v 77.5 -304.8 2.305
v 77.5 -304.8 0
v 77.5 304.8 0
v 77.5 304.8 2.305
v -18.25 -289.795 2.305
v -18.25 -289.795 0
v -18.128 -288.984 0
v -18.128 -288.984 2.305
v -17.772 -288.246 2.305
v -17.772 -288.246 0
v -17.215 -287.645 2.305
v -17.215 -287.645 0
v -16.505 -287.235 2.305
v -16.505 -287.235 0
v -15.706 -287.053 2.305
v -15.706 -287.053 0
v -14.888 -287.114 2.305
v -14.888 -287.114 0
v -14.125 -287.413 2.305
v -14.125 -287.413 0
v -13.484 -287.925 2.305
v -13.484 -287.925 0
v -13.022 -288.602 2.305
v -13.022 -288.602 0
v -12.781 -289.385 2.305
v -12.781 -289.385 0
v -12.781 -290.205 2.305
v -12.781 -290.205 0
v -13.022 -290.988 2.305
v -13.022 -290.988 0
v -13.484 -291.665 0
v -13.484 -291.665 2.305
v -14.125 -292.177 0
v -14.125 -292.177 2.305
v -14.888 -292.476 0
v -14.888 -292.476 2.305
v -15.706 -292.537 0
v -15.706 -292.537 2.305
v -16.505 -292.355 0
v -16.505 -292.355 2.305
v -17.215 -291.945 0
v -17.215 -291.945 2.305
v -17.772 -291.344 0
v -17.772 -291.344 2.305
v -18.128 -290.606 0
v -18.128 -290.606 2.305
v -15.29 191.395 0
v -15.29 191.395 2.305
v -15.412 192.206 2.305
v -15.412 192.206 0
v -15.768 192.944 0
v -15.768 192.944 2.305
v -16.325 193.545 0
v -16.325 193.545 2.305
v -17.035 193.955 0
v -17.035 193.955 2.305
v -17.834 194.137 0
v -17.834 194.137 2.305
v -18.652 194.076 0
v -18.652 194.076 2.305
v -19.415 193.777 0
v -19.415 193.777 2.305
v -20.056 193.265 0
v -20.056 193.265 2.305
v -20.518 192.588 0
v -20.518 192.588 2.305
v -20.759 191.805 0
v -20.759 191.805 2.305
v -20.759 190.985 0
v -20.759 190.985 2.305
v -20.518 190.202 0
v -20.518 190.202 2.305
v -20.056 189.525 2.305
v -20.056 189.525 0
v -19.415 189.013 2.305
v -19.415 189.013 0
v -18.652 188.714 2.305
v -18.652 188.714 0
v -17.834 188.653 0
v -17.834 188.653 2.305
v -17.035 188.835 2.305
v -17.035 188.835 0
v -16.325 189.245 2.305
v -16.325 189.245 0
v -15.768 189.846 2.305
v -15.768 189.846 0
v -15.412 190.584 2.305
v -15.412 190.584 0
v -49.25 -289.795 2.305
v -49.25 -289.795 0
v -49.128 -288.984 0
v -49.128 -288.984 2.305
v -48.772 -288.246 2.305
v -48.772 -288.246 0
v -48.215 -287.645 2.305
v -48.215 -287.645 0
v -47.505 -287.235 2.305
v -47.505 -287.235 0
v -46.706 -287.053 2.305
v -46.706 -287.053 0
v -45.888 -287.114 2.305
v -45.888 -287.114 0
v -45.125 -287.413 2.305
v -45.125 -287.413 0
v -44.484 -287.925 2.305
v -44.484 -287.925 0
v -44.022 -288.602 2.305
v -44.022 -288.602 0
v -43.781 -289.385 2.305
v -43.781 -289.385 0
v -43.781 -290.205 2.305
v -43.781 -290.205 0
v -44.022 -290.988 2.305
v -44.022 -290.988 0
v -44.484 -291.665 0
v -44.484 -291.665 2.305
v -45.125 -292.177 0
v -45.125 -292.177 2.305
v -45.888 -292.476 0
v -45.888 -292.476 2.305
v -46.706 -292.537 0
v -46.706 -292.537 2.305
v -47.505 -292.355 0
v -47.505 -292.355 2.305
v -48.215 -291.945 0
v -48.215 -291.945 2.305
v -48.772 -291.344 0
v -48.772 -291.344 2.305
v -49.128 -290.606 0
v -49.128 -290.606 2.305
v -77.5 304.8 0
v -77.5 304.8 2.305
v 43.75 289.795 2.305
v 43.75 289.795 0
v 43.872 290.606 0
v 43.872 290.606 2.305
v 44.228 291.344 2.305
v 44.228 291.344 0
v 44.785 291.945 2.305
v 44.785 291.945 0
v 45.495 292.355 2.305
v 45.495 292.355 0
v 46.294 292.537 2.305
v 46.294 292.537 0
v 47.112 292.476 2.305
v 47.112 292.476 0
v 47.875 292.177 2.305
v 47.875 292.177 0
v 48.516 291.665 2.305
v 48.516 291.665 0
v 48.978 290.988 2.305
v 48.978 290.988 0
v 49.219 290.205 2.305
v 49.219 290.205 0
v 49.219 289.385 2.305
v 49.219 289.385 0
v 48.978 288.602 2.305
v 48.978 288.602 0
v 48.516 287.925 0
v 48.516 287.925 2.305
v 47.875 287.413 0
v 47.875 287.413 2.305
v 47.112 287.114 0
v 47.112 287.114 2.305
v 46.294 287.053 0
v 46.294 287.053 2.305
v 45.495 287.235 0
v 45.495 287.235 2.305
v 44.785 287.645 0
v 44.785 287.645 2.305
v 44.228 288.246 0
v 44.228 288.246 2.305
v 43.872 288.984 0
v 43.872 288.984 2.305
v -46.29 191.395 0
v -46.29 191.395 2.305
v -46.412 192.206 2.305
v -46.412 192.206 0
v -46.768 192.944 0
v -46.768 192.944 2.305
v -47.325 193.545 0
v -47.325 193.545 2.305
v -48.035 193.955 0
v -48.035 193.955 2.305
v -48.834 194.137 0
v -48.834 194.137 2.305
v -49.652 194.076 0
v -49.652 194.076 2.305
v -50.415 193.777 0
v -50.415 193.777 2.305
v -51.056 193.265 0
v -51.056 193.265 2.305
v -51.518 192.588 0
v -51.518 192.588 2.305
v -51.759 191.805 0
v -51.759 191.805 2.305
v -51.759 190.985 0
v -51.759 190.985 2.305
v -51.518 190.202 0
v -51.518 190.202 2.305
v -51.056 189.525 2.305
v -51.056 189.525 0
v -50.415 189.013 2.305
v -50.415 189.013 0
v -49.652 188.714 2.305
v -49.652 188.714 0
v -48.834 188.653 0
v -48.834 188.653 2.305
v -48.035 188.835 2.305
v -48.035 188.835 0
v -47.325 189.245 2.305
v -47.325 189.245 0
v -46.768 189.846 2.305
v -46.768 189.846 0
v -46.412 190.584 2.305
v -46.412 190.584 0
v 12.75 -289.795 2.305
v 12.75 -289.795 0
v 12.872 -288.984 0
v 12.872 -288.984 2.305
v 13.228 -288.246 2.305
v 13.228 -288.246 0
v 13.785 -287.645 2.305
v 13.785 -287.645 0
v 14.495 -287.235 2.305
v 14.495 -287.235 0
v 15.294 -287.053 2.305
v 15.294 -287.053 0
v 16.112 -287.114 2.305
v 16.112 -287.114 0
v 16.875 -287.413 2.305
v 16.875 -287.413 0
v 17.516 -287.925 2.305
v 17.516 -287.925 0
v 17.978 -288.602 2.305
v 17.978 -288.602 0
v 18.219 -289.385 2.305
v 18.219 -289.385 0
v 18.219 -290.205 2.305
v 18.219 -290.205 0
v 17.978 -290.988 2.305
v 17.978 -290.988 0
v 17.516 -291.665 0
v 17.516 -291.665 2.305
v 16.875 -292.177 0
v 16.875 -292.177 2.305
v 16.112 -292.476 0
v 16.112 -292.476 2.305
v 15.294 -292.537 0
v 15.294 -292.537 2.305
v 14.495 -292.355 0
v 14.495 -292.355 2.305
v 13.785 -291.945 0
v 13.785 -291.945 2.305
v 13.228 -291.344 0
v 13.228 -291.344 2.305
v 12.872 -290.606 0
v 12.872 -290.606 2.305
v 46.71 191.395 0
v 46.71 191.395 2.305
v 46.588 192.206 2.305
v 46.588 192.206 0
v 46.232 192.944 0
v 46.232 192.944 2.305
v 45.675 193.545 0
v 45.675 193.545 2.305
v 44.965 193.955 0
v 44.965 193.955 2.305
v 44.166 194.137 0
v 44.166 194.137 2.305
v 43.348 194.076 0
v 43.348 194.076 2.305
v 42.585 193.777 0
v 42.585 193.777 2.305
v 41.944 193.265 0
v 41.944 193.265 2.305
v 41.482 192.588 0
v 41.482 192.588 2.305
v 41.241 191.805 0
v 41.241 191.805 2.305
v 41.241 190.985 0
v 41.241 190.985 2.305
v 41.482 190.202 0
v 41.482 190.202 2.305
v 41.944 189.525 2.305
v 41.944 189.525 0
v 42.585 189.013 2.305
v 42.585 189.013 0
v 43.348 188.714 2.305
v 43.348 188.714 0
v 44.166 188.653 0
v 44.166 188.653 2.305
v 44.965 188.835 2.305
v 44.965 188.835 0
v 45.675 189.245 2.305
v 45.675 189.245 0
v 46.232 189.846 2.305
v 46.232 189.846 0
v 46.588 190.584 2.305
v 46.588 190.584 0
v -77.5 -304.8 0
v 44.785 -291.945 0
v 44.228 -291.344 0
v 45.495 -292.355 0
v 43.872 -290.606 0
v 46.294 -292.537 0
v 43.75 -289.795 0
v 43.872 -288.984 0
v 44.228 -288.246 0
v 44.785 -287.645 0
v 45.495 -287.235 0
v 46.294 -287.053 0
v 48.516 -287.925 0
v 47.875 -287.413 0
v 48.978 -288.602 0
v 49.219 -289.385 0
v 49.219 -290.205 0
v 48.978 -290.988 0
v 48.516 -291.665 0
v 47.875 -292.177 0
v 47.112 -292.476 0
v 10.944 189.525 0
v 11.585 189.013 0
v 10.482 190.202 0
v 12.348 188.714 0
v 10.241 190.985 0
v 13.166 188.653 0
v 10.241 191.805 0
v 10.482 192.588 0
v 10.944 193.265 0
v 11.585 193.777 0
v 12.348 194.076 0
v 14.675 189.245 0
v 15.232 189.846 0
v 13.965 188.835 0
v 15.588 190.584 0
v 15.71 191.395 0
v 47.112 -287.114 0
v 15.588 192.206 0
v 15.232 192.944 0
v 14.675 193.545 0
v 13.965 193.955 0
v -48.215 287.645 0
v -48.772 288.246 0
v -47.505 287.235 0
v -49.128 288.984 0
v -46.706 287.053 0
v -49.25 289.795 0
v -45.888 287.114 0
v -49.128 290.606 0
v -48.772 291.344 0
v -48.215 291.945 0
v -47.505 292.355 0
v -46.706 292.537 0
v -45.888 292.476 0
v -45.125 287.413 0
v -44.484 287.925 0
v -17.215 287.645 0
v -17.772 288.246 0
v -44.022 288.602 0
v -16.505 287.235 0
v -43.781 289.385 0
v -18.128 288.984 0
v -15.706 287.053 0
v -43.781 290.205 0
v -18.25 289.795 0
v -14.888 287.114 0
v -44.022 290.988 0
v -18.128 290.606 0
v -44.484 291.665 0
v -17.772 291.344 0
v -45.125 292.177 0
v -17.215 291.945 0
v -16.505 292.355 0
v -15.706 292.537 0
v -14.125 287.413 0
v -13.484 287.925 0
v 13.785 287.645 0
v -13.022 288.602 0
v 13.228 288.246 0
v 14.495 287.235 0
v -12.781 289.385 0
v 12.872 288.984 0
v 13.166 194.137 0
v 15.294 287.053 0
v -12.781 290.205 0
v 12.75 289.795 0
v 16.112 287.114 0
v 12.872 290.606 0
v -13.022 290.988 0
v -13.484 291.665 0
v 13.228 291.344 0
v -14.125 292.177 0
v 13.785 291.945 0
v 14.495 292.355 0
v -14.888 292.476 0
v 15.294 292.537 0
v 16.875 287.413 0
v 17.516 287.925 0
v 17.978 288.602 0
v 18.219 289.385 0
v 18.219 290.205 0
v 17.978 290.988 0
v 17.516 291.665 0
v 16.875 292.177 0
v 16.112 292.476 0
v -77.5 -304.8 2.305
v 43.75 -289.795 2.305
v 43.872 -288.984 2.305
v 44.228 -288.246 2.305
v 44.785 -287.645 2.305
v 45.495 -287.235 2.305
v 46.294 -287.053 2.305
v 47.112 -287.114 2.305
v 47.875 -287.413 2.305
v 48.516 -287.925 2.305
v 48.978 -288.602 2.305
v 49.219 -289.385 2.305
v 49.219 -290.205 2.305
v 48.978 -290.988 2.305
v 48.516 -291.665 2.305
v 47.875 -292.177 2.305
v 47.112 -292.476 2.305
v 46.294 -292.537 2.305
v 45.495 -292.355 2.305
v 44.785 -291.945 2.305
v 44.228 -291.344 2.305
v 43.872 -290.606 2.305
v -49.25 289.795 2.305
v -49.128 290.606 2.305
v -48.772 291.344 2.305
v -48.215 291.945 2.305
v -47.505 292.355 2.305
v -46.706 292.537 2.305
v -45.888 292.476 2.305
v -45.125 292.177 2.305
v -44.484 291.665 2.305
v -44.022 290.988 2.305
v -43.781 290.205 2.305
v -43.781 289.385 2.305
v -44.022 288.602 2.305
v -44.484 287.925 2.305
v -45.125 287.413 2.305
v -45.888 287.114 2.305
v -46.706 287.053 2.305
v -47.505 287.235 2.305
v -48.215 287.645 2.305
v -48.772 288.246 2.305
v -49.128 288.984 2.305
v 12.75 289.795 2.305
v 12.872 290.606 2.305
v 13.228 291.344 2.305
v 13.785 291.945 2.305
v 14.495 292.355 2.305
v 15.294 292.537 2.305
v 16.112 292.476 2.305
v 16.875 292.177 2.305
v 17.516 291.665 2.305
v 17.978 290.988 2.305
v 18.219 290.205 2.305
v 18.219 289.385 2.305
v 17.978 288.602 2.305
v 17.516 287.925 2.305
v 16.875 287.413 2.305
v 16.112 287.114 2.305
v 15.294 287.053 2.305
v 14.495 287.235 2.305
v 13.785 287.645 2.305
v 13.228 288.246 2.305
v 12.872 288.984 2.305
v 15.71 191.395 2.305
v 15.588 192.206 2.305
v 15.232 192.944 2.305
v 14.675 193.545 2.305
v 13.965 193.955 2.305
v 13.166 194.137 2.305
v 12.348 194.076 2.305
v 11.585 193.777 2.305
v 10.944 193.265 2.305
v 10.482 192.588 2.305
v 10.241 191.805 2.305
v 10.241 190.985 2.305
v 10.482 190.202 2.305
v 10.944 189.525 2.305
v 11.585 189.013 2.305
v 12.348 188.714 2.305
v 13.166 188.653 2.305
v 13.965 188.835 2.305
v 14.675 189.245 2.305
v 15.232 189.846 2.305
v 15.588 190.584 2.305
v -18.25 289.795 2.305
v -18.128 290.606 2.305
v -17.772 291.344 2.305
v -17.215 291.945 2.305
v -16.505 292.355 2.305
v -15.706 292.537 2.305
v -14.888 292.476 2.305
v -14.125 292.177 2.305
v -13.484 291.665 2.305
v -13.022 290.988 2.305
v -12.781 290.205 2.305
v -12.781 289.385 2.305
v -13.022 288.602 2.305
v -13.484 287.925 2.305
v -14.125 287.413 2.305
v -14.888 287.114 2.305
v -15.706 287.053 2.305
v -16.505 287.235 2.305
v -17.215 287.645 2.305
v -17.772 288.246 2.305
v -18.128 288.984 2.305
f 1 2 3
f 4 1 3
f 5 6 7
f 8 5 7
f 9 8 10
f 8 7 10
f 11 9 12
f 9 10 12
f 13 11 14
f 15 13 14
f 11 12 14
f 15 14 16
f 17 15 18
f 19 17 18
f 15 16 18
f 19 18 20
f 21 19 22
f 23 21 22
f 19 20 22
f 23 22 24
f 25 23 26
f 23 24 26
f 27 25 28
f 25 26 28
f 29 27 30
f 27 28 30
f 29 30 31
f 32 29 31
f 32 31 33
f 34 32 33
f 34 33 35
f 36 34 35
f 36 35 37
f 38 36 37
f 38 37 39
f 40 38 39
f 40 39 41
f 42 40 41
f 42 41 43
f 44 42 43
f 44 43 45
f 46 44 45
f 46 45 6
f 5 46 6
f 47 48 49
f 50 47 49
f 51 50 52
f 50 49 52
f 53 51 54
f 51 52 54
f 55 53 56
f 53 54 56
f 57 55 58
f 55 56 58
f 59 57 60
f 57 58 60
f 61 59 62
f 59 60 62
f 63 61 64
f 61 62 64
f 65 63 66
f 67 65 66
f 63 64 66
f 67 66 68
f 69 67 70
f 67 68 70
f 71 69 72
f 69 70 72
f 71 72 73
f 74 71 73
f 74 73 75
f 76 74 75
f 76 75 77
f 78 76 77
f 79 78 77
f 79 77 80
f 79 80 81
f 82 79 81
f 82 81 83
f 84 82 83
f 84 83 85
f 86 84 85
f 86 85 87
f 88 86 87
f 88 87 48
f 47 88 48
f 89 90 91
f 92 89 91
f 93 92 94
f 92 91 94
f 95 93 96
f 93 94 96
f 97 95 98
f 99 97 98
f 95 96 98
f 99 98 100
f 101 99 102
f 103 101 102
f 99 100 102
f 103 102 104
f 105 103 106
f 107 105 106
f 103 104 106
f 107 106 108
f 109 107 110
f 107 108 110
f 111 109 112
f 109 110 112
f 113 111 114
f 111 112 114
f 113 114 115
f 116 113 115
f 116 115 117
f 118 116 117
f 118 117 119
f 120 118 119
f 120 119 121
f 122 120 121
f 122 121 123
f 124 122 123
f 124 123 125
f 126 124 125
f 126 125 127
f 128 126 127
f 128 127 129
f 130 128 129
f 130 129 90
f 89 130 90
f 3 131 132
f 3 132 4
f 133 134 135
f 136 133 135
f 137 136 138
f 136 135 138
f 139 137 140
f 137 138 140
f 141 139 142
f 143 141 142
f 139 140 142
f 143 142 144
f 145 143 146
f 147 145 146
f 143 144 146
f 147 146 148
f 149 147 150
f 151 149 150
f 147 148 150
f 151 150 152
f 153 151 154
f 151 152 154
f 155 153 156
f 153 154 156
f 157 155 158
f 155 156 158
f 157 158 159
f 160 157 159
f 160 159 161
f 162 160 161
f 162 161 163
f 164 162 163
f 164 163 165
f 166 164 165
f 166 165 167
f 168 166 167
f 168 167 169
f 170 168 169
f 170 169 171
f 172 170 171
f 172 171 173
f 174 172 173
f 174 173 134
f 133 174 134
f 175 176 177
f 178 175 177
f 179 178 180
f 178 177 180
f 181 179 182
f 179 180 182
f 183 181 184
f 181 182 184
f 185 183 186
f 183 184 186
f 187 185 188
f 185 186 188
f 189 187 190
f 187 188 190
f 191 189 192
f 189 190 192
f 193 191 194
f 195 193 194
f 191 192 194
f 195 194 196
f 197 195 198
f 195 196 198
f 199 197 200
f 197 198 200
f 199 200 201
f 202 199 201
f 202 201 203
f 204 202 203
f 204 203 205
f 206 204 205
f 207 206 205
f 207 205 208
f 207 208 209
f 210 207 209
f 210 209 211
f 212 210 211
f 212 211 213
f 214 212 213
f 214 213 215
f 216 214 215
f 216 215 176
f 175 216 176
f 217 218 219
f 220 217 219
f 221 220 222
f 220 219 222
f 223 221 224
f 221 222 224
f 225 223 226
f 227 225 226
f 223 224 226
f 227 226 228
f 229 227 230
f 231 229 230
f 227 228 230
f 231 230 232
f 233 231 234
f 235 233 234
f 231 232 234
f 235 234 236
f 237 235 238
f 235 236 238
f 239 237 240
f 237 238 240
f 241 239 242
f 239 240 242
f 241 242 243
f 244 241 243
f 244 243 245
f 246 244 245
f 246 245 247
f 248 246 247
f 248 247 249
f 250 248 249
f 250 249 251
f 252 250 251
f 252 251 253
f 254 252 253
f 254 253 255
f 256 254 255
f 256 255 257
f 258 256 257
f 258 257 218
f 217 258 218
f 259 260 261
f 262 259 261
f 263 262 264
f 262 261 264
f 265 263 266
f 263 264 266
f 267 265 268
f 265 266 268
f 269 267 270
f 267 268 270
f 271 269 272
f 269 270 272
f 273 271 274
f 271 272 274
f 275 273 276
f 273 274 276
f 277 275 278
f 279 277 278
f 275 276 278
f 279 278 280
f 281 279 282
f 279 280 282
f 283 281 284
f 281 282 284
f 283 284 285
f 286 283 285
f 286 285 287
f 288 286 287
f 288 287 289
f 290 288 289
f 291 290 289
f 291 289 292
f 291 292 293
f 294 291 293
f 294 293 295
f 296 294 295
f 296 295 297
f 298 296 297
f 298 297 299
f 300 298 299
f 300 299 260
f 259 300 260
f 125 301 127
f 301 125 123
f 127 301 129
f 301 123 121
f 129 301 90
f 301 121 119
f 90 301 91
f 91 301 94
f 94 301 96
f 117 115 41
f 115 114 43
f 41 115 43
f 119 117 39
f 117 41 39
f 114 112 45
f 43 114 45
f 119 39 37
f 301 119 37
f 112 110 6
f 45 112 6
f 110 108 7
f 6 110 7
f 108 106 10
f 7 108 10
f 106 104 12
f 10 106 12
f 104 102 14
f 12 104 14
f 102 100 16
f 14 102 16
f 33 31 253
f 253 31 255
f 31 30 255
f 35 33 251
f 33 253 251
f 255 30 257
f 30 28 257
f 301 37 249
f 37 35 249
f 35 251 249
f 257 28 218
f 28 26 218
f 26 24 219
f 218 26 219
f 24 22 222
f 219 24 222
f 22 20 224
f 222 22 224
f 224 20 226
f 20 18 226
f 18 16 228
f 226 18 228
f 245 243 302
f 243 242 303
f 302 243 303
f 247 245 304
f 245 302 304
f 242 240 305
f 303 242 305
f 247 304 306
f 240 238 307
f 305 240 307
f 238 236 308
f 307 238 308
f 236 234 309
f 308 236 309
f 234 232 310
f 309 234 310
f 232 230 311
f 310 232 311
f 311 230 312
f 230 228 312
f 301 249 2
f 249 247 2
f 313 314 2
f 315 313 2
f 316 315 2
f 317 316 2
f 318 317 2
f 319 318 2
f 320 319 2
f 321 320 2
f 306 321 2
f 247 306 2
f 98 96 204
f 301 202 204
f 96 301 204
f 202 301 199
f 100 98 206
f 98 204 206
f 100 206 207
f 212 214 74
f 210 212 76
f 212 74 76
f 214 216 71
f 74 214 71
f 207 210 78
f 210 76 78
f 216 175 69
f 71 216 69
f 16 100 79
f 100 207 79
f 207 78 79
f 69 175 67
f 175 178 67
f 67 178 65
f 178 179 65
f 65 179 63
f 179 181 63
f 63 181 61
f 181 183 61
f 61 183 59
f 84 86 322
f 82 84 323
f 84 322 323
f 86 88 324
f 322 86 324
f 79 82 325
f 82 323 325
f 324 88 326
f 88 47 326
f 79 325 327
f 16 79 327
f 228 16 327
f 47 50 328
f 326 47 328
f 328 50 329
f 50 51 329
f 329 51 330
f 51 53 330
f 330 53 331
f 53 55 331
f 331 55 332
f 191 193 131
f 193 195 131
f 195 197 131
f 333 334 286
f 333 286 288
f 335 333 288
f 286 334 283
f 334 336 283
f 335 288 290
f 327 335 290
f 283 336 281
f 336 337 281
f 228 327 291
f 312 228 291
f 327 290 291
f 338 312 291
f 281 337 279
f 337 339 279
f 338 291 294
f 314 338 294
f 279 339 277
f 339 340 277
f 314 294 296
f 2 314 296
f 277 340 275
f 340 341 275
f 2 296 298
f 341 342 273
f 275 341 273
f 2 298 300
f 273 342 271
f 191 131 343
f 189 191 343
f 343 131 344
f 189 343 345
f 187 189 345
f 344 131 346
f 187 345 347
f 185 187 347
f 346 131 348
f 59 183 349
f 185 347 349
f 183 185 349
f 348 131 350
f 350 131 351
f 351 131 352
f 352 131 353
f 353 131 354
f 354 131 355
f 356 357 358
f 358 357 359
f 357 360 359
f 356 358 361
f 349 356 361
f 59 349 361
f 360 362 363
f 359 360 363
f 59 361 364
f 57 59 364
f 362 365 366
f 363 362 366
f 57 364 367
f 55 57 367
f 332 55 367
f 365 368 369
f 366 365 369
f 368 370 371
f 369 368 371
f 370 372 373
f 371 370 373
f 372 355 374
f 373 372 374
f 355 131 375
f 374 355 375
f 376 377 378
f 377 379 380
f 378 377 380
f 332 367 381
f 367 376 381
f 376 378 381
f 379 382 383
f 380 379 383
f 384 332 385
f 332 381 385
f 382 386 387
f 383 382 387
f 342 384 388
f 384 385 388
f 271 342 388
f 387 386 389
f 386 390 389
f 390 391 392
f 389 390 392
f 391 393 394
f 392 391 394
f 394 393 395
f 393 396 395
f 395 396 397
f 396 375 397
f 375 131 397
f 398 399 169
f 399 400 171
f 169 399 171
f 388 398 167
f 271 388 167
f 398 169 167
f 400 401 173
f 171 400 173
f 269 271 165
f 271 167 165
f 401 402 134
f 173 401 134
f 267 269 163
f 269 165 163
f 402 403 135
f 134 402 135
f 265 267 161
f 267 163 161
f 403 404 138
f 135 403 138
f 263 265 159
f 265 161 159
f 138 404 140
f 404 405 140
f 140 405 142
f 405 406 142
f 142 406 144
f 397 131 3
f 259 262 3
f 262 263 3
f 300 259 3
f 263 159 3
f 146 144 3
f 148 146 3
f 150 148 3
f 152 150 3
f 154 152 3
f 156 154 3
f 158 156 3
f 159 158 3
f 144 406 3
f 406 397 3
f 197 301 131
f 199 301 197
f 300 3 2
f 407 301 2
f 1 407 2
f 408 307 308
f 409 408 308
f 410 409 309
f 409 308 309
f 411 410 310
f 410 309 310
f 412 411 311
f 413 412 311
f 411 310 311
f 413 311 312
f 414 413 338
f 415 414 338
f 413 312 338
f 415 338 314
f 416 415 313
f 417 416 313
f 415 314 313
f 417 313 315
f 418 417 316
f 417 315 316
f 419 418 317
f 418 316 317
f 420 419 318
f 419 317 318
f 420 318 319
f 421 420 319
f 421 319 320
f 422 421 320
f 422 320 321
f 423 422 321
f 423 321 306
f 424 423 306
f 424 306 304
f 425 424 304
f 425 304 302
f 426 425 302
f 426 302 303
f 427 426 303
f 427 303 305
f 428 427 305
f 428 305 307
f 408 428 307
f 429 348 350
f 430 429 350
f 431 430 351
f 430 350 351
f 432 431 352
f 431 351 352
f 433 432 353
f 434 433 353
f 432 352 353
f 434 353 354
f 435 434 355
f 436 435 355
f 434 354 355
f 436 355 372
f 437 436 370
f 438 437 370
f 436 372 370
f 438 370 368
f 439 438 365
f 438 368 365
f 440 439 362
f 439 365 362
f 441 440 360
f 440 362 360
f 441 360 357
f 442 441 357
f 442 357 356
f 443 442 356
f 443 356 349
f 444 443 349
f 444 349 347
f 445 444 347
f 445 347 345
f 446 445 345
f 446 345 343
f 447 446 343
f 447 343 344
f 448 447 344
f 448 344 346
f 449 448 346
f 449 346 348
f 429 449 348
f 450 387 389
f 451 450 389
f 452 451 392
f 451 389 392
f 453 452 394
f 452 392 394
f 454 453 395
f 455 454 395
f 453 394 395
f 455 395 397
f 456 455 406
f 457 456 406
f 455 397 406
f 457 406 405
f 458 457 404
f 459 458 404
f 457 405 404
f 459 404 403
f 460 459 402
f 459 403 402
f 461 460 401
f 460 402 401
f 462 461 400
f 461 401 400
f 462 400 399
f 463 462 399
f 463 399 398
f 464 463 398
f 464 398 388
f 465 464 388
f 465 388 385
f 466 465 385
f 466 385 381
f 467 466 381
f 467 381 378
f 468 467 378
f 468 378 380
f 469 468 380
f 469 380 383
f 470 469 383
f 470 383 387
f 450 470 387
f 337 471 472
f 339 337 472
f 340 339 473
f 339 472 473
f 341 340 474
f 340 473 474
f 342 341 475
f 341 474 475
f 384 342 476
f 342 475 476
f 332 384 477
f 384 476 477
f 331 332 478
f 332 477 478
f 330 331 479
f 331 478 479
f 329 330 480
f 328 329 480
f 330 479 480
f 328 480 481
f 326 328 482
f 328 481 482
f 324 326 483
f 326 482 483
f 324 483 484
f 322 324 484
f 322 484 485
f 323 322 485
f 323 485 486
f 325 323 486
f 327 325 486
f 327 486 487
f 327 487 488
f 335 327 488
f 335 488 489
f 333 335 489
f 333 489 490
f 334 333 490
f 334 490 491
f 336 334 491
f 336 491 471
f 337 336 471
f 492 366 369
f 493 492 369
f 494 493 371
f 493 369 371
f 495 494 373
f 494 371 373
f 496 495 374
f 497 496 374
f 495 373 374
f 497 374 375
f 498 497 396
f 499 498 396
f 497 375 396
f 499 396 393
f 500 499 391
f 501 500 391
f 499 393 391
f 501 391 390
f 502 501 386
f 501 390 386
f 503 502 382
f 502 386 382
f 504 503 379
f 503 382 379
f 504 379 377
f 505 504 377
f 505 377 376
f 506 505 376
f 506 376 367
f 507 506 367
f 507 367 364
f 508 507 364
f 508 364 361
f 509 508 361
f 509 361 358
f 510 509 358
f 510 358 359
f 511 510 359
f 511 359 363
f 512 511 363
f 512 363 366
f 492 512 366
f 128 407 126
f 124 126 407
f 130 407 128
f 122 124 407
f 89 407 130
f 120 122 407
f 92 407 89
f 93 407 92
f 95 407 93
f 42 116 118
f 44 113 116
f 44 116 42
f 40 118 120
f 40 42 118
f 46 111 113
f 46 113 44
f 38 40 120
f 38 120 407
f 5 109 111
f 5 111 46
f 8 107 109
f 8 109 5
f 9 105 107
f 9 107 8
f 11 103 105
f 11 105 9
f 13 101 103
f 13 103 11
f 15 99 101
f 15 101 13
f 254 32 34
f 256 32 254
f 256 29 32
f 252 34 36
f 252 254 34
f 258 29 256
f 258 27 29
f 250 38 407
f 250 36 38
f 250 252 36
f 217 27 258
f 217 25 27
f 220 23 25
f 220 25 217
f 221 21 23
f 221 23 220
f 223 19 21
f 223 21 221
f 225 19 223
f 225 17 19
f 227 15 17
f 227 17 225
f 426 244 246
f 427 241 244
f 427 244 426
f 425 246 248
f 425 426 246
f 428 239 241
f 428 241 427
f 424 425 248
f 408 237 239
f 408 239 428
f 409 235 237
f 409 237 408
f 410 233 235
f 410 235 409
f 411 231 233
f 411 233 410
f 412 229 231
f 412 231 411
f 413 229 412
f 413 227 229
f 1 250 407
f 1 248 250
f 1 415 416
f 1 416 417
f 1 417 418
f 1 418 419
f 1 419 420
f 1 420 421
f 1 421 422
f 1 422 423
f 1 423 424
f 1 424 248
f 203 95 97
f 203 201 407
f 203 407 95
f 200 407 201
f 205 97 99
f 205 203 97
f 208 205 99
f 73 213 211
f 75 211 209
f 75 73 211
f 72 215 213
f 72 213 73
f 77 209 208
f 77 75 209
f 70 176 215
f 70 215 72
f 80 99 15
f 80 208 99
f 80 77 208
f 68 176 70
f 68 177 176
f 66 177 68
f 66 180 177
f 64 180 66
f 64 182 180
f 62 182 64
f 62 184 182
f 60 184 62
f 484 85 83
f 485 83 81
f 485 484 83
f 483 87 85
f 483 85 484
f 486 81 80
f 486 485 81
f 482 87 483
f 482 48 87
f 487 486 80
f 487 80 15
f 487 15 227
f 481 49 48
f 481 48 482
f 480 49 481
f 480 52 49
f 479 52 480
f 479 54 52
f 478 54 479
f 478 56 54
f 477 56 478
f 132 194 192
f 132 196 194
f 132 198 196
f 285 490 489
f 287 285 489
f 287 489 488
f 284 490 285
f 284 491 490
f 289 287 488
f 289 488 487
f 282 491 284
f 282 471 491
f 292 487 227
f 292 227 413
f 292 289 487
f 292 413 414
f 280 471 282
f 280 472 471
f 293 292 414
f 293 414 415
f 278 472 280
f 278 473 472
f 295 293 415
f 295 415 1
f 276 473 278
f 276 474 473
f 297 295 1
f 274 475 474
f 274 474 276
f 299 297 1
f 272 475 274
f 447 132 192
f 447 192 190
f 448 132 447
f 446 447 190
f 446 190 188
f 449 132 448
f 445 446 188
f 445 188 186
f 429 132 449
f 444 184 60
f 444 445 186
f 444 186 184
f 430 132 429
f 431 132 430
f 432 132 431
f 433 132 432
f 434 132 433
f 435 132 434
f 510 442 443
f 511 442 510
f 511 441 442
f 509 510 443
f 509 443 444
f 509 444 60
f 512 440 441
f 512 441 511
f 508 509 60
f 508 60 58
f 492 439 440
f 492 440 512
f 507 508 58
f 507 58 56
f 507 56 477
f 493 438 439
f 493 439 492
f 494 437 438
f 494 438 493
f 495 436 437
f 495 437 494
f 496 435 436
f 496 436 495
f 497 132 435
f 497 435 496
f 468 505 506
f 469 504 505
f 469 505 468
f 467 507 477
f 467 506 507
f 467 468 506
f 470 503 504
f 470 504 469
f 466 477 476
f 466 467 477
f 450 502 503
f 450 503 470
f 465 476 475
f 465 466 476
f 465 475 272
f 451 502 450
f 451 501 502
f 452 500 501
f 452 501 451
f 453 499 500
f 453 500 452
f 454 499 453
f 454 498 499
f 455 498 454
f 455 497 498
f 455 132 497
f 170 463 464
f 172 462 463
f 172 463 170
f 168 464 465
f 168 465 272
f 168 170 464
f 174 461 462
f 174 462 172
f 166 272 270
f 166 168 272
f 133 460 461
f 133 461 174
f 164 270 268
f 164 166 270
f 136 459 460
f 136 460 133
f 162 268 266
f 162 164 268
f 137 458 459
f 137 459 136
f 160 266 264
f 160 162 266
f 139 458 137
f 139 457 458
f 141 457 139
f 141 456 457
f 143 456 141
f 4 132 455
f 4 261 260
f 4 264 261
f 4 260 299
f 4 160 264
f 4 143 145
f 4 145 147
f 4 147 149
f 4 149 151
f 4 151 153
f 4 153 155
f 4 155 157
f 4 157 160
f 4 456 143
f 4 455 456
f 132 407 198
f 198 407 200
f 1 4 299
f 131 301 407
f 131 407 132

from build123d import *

# Parameters (mm, degrees)
SKETCH1_W            = 155
SKETCH1_H            = 609.6
BOSS_EXTRUDE1_DEPTH  = 2.305
M5_CLEARANCE_HOLE1_D = 5.5
SKETCH4_R            = 2.75
CUT_EXTRUDE1_DEPTH   = 3.305
LPATTERN2_COUNT      = 4
LPATTERN2_PITCH      = 31


with BuildPart() as part:
    # Sketch1 → Boss-Extrude1 (new body)
    with BuildSketch(Plane.XY):
        Rectangle(SKETCH1_W, SKETCH1_H)
    extrude(amount=BOSS_EXTRUDE1_DEPTH)

    # M5 Clearance Hole1 (through all)
    with Locations(Plane.XY.offset(2.305)):
        with Locations((-46.5, 289.795), (-15.5, 289.795), (15.5, 289.795), (46.5, 289.795), (-46.5, -289.795), (-15.5, -289.795), (15.5, -289.795), (46.5, -289.795)):
            Hole(M5_CLEARANCE_HOLE1_D / 2)

    # Sketch4 → Cut-Extrude1 (cut, through all)
    with BuildSketch(Plane.XY.offset(2.305)):
        with Locations((-49.04, 191.395)):
            Circle(SKETCH4_R)
    cut_extrude1 = extrude(amount=-CUT_EXTRUDE1_DEPTH, mode=Mode.SUBTRACT)

    # LPattern2: Cut-Extrude1 ×4
    with Locations(*[(i * LPATTERN2_PITCH, 0, 0) for i in range(1, LPATTERN2_COUNT)]):
        add(cut_extrude1, mode=Mode.SUBTRACT)


solid = part.part
